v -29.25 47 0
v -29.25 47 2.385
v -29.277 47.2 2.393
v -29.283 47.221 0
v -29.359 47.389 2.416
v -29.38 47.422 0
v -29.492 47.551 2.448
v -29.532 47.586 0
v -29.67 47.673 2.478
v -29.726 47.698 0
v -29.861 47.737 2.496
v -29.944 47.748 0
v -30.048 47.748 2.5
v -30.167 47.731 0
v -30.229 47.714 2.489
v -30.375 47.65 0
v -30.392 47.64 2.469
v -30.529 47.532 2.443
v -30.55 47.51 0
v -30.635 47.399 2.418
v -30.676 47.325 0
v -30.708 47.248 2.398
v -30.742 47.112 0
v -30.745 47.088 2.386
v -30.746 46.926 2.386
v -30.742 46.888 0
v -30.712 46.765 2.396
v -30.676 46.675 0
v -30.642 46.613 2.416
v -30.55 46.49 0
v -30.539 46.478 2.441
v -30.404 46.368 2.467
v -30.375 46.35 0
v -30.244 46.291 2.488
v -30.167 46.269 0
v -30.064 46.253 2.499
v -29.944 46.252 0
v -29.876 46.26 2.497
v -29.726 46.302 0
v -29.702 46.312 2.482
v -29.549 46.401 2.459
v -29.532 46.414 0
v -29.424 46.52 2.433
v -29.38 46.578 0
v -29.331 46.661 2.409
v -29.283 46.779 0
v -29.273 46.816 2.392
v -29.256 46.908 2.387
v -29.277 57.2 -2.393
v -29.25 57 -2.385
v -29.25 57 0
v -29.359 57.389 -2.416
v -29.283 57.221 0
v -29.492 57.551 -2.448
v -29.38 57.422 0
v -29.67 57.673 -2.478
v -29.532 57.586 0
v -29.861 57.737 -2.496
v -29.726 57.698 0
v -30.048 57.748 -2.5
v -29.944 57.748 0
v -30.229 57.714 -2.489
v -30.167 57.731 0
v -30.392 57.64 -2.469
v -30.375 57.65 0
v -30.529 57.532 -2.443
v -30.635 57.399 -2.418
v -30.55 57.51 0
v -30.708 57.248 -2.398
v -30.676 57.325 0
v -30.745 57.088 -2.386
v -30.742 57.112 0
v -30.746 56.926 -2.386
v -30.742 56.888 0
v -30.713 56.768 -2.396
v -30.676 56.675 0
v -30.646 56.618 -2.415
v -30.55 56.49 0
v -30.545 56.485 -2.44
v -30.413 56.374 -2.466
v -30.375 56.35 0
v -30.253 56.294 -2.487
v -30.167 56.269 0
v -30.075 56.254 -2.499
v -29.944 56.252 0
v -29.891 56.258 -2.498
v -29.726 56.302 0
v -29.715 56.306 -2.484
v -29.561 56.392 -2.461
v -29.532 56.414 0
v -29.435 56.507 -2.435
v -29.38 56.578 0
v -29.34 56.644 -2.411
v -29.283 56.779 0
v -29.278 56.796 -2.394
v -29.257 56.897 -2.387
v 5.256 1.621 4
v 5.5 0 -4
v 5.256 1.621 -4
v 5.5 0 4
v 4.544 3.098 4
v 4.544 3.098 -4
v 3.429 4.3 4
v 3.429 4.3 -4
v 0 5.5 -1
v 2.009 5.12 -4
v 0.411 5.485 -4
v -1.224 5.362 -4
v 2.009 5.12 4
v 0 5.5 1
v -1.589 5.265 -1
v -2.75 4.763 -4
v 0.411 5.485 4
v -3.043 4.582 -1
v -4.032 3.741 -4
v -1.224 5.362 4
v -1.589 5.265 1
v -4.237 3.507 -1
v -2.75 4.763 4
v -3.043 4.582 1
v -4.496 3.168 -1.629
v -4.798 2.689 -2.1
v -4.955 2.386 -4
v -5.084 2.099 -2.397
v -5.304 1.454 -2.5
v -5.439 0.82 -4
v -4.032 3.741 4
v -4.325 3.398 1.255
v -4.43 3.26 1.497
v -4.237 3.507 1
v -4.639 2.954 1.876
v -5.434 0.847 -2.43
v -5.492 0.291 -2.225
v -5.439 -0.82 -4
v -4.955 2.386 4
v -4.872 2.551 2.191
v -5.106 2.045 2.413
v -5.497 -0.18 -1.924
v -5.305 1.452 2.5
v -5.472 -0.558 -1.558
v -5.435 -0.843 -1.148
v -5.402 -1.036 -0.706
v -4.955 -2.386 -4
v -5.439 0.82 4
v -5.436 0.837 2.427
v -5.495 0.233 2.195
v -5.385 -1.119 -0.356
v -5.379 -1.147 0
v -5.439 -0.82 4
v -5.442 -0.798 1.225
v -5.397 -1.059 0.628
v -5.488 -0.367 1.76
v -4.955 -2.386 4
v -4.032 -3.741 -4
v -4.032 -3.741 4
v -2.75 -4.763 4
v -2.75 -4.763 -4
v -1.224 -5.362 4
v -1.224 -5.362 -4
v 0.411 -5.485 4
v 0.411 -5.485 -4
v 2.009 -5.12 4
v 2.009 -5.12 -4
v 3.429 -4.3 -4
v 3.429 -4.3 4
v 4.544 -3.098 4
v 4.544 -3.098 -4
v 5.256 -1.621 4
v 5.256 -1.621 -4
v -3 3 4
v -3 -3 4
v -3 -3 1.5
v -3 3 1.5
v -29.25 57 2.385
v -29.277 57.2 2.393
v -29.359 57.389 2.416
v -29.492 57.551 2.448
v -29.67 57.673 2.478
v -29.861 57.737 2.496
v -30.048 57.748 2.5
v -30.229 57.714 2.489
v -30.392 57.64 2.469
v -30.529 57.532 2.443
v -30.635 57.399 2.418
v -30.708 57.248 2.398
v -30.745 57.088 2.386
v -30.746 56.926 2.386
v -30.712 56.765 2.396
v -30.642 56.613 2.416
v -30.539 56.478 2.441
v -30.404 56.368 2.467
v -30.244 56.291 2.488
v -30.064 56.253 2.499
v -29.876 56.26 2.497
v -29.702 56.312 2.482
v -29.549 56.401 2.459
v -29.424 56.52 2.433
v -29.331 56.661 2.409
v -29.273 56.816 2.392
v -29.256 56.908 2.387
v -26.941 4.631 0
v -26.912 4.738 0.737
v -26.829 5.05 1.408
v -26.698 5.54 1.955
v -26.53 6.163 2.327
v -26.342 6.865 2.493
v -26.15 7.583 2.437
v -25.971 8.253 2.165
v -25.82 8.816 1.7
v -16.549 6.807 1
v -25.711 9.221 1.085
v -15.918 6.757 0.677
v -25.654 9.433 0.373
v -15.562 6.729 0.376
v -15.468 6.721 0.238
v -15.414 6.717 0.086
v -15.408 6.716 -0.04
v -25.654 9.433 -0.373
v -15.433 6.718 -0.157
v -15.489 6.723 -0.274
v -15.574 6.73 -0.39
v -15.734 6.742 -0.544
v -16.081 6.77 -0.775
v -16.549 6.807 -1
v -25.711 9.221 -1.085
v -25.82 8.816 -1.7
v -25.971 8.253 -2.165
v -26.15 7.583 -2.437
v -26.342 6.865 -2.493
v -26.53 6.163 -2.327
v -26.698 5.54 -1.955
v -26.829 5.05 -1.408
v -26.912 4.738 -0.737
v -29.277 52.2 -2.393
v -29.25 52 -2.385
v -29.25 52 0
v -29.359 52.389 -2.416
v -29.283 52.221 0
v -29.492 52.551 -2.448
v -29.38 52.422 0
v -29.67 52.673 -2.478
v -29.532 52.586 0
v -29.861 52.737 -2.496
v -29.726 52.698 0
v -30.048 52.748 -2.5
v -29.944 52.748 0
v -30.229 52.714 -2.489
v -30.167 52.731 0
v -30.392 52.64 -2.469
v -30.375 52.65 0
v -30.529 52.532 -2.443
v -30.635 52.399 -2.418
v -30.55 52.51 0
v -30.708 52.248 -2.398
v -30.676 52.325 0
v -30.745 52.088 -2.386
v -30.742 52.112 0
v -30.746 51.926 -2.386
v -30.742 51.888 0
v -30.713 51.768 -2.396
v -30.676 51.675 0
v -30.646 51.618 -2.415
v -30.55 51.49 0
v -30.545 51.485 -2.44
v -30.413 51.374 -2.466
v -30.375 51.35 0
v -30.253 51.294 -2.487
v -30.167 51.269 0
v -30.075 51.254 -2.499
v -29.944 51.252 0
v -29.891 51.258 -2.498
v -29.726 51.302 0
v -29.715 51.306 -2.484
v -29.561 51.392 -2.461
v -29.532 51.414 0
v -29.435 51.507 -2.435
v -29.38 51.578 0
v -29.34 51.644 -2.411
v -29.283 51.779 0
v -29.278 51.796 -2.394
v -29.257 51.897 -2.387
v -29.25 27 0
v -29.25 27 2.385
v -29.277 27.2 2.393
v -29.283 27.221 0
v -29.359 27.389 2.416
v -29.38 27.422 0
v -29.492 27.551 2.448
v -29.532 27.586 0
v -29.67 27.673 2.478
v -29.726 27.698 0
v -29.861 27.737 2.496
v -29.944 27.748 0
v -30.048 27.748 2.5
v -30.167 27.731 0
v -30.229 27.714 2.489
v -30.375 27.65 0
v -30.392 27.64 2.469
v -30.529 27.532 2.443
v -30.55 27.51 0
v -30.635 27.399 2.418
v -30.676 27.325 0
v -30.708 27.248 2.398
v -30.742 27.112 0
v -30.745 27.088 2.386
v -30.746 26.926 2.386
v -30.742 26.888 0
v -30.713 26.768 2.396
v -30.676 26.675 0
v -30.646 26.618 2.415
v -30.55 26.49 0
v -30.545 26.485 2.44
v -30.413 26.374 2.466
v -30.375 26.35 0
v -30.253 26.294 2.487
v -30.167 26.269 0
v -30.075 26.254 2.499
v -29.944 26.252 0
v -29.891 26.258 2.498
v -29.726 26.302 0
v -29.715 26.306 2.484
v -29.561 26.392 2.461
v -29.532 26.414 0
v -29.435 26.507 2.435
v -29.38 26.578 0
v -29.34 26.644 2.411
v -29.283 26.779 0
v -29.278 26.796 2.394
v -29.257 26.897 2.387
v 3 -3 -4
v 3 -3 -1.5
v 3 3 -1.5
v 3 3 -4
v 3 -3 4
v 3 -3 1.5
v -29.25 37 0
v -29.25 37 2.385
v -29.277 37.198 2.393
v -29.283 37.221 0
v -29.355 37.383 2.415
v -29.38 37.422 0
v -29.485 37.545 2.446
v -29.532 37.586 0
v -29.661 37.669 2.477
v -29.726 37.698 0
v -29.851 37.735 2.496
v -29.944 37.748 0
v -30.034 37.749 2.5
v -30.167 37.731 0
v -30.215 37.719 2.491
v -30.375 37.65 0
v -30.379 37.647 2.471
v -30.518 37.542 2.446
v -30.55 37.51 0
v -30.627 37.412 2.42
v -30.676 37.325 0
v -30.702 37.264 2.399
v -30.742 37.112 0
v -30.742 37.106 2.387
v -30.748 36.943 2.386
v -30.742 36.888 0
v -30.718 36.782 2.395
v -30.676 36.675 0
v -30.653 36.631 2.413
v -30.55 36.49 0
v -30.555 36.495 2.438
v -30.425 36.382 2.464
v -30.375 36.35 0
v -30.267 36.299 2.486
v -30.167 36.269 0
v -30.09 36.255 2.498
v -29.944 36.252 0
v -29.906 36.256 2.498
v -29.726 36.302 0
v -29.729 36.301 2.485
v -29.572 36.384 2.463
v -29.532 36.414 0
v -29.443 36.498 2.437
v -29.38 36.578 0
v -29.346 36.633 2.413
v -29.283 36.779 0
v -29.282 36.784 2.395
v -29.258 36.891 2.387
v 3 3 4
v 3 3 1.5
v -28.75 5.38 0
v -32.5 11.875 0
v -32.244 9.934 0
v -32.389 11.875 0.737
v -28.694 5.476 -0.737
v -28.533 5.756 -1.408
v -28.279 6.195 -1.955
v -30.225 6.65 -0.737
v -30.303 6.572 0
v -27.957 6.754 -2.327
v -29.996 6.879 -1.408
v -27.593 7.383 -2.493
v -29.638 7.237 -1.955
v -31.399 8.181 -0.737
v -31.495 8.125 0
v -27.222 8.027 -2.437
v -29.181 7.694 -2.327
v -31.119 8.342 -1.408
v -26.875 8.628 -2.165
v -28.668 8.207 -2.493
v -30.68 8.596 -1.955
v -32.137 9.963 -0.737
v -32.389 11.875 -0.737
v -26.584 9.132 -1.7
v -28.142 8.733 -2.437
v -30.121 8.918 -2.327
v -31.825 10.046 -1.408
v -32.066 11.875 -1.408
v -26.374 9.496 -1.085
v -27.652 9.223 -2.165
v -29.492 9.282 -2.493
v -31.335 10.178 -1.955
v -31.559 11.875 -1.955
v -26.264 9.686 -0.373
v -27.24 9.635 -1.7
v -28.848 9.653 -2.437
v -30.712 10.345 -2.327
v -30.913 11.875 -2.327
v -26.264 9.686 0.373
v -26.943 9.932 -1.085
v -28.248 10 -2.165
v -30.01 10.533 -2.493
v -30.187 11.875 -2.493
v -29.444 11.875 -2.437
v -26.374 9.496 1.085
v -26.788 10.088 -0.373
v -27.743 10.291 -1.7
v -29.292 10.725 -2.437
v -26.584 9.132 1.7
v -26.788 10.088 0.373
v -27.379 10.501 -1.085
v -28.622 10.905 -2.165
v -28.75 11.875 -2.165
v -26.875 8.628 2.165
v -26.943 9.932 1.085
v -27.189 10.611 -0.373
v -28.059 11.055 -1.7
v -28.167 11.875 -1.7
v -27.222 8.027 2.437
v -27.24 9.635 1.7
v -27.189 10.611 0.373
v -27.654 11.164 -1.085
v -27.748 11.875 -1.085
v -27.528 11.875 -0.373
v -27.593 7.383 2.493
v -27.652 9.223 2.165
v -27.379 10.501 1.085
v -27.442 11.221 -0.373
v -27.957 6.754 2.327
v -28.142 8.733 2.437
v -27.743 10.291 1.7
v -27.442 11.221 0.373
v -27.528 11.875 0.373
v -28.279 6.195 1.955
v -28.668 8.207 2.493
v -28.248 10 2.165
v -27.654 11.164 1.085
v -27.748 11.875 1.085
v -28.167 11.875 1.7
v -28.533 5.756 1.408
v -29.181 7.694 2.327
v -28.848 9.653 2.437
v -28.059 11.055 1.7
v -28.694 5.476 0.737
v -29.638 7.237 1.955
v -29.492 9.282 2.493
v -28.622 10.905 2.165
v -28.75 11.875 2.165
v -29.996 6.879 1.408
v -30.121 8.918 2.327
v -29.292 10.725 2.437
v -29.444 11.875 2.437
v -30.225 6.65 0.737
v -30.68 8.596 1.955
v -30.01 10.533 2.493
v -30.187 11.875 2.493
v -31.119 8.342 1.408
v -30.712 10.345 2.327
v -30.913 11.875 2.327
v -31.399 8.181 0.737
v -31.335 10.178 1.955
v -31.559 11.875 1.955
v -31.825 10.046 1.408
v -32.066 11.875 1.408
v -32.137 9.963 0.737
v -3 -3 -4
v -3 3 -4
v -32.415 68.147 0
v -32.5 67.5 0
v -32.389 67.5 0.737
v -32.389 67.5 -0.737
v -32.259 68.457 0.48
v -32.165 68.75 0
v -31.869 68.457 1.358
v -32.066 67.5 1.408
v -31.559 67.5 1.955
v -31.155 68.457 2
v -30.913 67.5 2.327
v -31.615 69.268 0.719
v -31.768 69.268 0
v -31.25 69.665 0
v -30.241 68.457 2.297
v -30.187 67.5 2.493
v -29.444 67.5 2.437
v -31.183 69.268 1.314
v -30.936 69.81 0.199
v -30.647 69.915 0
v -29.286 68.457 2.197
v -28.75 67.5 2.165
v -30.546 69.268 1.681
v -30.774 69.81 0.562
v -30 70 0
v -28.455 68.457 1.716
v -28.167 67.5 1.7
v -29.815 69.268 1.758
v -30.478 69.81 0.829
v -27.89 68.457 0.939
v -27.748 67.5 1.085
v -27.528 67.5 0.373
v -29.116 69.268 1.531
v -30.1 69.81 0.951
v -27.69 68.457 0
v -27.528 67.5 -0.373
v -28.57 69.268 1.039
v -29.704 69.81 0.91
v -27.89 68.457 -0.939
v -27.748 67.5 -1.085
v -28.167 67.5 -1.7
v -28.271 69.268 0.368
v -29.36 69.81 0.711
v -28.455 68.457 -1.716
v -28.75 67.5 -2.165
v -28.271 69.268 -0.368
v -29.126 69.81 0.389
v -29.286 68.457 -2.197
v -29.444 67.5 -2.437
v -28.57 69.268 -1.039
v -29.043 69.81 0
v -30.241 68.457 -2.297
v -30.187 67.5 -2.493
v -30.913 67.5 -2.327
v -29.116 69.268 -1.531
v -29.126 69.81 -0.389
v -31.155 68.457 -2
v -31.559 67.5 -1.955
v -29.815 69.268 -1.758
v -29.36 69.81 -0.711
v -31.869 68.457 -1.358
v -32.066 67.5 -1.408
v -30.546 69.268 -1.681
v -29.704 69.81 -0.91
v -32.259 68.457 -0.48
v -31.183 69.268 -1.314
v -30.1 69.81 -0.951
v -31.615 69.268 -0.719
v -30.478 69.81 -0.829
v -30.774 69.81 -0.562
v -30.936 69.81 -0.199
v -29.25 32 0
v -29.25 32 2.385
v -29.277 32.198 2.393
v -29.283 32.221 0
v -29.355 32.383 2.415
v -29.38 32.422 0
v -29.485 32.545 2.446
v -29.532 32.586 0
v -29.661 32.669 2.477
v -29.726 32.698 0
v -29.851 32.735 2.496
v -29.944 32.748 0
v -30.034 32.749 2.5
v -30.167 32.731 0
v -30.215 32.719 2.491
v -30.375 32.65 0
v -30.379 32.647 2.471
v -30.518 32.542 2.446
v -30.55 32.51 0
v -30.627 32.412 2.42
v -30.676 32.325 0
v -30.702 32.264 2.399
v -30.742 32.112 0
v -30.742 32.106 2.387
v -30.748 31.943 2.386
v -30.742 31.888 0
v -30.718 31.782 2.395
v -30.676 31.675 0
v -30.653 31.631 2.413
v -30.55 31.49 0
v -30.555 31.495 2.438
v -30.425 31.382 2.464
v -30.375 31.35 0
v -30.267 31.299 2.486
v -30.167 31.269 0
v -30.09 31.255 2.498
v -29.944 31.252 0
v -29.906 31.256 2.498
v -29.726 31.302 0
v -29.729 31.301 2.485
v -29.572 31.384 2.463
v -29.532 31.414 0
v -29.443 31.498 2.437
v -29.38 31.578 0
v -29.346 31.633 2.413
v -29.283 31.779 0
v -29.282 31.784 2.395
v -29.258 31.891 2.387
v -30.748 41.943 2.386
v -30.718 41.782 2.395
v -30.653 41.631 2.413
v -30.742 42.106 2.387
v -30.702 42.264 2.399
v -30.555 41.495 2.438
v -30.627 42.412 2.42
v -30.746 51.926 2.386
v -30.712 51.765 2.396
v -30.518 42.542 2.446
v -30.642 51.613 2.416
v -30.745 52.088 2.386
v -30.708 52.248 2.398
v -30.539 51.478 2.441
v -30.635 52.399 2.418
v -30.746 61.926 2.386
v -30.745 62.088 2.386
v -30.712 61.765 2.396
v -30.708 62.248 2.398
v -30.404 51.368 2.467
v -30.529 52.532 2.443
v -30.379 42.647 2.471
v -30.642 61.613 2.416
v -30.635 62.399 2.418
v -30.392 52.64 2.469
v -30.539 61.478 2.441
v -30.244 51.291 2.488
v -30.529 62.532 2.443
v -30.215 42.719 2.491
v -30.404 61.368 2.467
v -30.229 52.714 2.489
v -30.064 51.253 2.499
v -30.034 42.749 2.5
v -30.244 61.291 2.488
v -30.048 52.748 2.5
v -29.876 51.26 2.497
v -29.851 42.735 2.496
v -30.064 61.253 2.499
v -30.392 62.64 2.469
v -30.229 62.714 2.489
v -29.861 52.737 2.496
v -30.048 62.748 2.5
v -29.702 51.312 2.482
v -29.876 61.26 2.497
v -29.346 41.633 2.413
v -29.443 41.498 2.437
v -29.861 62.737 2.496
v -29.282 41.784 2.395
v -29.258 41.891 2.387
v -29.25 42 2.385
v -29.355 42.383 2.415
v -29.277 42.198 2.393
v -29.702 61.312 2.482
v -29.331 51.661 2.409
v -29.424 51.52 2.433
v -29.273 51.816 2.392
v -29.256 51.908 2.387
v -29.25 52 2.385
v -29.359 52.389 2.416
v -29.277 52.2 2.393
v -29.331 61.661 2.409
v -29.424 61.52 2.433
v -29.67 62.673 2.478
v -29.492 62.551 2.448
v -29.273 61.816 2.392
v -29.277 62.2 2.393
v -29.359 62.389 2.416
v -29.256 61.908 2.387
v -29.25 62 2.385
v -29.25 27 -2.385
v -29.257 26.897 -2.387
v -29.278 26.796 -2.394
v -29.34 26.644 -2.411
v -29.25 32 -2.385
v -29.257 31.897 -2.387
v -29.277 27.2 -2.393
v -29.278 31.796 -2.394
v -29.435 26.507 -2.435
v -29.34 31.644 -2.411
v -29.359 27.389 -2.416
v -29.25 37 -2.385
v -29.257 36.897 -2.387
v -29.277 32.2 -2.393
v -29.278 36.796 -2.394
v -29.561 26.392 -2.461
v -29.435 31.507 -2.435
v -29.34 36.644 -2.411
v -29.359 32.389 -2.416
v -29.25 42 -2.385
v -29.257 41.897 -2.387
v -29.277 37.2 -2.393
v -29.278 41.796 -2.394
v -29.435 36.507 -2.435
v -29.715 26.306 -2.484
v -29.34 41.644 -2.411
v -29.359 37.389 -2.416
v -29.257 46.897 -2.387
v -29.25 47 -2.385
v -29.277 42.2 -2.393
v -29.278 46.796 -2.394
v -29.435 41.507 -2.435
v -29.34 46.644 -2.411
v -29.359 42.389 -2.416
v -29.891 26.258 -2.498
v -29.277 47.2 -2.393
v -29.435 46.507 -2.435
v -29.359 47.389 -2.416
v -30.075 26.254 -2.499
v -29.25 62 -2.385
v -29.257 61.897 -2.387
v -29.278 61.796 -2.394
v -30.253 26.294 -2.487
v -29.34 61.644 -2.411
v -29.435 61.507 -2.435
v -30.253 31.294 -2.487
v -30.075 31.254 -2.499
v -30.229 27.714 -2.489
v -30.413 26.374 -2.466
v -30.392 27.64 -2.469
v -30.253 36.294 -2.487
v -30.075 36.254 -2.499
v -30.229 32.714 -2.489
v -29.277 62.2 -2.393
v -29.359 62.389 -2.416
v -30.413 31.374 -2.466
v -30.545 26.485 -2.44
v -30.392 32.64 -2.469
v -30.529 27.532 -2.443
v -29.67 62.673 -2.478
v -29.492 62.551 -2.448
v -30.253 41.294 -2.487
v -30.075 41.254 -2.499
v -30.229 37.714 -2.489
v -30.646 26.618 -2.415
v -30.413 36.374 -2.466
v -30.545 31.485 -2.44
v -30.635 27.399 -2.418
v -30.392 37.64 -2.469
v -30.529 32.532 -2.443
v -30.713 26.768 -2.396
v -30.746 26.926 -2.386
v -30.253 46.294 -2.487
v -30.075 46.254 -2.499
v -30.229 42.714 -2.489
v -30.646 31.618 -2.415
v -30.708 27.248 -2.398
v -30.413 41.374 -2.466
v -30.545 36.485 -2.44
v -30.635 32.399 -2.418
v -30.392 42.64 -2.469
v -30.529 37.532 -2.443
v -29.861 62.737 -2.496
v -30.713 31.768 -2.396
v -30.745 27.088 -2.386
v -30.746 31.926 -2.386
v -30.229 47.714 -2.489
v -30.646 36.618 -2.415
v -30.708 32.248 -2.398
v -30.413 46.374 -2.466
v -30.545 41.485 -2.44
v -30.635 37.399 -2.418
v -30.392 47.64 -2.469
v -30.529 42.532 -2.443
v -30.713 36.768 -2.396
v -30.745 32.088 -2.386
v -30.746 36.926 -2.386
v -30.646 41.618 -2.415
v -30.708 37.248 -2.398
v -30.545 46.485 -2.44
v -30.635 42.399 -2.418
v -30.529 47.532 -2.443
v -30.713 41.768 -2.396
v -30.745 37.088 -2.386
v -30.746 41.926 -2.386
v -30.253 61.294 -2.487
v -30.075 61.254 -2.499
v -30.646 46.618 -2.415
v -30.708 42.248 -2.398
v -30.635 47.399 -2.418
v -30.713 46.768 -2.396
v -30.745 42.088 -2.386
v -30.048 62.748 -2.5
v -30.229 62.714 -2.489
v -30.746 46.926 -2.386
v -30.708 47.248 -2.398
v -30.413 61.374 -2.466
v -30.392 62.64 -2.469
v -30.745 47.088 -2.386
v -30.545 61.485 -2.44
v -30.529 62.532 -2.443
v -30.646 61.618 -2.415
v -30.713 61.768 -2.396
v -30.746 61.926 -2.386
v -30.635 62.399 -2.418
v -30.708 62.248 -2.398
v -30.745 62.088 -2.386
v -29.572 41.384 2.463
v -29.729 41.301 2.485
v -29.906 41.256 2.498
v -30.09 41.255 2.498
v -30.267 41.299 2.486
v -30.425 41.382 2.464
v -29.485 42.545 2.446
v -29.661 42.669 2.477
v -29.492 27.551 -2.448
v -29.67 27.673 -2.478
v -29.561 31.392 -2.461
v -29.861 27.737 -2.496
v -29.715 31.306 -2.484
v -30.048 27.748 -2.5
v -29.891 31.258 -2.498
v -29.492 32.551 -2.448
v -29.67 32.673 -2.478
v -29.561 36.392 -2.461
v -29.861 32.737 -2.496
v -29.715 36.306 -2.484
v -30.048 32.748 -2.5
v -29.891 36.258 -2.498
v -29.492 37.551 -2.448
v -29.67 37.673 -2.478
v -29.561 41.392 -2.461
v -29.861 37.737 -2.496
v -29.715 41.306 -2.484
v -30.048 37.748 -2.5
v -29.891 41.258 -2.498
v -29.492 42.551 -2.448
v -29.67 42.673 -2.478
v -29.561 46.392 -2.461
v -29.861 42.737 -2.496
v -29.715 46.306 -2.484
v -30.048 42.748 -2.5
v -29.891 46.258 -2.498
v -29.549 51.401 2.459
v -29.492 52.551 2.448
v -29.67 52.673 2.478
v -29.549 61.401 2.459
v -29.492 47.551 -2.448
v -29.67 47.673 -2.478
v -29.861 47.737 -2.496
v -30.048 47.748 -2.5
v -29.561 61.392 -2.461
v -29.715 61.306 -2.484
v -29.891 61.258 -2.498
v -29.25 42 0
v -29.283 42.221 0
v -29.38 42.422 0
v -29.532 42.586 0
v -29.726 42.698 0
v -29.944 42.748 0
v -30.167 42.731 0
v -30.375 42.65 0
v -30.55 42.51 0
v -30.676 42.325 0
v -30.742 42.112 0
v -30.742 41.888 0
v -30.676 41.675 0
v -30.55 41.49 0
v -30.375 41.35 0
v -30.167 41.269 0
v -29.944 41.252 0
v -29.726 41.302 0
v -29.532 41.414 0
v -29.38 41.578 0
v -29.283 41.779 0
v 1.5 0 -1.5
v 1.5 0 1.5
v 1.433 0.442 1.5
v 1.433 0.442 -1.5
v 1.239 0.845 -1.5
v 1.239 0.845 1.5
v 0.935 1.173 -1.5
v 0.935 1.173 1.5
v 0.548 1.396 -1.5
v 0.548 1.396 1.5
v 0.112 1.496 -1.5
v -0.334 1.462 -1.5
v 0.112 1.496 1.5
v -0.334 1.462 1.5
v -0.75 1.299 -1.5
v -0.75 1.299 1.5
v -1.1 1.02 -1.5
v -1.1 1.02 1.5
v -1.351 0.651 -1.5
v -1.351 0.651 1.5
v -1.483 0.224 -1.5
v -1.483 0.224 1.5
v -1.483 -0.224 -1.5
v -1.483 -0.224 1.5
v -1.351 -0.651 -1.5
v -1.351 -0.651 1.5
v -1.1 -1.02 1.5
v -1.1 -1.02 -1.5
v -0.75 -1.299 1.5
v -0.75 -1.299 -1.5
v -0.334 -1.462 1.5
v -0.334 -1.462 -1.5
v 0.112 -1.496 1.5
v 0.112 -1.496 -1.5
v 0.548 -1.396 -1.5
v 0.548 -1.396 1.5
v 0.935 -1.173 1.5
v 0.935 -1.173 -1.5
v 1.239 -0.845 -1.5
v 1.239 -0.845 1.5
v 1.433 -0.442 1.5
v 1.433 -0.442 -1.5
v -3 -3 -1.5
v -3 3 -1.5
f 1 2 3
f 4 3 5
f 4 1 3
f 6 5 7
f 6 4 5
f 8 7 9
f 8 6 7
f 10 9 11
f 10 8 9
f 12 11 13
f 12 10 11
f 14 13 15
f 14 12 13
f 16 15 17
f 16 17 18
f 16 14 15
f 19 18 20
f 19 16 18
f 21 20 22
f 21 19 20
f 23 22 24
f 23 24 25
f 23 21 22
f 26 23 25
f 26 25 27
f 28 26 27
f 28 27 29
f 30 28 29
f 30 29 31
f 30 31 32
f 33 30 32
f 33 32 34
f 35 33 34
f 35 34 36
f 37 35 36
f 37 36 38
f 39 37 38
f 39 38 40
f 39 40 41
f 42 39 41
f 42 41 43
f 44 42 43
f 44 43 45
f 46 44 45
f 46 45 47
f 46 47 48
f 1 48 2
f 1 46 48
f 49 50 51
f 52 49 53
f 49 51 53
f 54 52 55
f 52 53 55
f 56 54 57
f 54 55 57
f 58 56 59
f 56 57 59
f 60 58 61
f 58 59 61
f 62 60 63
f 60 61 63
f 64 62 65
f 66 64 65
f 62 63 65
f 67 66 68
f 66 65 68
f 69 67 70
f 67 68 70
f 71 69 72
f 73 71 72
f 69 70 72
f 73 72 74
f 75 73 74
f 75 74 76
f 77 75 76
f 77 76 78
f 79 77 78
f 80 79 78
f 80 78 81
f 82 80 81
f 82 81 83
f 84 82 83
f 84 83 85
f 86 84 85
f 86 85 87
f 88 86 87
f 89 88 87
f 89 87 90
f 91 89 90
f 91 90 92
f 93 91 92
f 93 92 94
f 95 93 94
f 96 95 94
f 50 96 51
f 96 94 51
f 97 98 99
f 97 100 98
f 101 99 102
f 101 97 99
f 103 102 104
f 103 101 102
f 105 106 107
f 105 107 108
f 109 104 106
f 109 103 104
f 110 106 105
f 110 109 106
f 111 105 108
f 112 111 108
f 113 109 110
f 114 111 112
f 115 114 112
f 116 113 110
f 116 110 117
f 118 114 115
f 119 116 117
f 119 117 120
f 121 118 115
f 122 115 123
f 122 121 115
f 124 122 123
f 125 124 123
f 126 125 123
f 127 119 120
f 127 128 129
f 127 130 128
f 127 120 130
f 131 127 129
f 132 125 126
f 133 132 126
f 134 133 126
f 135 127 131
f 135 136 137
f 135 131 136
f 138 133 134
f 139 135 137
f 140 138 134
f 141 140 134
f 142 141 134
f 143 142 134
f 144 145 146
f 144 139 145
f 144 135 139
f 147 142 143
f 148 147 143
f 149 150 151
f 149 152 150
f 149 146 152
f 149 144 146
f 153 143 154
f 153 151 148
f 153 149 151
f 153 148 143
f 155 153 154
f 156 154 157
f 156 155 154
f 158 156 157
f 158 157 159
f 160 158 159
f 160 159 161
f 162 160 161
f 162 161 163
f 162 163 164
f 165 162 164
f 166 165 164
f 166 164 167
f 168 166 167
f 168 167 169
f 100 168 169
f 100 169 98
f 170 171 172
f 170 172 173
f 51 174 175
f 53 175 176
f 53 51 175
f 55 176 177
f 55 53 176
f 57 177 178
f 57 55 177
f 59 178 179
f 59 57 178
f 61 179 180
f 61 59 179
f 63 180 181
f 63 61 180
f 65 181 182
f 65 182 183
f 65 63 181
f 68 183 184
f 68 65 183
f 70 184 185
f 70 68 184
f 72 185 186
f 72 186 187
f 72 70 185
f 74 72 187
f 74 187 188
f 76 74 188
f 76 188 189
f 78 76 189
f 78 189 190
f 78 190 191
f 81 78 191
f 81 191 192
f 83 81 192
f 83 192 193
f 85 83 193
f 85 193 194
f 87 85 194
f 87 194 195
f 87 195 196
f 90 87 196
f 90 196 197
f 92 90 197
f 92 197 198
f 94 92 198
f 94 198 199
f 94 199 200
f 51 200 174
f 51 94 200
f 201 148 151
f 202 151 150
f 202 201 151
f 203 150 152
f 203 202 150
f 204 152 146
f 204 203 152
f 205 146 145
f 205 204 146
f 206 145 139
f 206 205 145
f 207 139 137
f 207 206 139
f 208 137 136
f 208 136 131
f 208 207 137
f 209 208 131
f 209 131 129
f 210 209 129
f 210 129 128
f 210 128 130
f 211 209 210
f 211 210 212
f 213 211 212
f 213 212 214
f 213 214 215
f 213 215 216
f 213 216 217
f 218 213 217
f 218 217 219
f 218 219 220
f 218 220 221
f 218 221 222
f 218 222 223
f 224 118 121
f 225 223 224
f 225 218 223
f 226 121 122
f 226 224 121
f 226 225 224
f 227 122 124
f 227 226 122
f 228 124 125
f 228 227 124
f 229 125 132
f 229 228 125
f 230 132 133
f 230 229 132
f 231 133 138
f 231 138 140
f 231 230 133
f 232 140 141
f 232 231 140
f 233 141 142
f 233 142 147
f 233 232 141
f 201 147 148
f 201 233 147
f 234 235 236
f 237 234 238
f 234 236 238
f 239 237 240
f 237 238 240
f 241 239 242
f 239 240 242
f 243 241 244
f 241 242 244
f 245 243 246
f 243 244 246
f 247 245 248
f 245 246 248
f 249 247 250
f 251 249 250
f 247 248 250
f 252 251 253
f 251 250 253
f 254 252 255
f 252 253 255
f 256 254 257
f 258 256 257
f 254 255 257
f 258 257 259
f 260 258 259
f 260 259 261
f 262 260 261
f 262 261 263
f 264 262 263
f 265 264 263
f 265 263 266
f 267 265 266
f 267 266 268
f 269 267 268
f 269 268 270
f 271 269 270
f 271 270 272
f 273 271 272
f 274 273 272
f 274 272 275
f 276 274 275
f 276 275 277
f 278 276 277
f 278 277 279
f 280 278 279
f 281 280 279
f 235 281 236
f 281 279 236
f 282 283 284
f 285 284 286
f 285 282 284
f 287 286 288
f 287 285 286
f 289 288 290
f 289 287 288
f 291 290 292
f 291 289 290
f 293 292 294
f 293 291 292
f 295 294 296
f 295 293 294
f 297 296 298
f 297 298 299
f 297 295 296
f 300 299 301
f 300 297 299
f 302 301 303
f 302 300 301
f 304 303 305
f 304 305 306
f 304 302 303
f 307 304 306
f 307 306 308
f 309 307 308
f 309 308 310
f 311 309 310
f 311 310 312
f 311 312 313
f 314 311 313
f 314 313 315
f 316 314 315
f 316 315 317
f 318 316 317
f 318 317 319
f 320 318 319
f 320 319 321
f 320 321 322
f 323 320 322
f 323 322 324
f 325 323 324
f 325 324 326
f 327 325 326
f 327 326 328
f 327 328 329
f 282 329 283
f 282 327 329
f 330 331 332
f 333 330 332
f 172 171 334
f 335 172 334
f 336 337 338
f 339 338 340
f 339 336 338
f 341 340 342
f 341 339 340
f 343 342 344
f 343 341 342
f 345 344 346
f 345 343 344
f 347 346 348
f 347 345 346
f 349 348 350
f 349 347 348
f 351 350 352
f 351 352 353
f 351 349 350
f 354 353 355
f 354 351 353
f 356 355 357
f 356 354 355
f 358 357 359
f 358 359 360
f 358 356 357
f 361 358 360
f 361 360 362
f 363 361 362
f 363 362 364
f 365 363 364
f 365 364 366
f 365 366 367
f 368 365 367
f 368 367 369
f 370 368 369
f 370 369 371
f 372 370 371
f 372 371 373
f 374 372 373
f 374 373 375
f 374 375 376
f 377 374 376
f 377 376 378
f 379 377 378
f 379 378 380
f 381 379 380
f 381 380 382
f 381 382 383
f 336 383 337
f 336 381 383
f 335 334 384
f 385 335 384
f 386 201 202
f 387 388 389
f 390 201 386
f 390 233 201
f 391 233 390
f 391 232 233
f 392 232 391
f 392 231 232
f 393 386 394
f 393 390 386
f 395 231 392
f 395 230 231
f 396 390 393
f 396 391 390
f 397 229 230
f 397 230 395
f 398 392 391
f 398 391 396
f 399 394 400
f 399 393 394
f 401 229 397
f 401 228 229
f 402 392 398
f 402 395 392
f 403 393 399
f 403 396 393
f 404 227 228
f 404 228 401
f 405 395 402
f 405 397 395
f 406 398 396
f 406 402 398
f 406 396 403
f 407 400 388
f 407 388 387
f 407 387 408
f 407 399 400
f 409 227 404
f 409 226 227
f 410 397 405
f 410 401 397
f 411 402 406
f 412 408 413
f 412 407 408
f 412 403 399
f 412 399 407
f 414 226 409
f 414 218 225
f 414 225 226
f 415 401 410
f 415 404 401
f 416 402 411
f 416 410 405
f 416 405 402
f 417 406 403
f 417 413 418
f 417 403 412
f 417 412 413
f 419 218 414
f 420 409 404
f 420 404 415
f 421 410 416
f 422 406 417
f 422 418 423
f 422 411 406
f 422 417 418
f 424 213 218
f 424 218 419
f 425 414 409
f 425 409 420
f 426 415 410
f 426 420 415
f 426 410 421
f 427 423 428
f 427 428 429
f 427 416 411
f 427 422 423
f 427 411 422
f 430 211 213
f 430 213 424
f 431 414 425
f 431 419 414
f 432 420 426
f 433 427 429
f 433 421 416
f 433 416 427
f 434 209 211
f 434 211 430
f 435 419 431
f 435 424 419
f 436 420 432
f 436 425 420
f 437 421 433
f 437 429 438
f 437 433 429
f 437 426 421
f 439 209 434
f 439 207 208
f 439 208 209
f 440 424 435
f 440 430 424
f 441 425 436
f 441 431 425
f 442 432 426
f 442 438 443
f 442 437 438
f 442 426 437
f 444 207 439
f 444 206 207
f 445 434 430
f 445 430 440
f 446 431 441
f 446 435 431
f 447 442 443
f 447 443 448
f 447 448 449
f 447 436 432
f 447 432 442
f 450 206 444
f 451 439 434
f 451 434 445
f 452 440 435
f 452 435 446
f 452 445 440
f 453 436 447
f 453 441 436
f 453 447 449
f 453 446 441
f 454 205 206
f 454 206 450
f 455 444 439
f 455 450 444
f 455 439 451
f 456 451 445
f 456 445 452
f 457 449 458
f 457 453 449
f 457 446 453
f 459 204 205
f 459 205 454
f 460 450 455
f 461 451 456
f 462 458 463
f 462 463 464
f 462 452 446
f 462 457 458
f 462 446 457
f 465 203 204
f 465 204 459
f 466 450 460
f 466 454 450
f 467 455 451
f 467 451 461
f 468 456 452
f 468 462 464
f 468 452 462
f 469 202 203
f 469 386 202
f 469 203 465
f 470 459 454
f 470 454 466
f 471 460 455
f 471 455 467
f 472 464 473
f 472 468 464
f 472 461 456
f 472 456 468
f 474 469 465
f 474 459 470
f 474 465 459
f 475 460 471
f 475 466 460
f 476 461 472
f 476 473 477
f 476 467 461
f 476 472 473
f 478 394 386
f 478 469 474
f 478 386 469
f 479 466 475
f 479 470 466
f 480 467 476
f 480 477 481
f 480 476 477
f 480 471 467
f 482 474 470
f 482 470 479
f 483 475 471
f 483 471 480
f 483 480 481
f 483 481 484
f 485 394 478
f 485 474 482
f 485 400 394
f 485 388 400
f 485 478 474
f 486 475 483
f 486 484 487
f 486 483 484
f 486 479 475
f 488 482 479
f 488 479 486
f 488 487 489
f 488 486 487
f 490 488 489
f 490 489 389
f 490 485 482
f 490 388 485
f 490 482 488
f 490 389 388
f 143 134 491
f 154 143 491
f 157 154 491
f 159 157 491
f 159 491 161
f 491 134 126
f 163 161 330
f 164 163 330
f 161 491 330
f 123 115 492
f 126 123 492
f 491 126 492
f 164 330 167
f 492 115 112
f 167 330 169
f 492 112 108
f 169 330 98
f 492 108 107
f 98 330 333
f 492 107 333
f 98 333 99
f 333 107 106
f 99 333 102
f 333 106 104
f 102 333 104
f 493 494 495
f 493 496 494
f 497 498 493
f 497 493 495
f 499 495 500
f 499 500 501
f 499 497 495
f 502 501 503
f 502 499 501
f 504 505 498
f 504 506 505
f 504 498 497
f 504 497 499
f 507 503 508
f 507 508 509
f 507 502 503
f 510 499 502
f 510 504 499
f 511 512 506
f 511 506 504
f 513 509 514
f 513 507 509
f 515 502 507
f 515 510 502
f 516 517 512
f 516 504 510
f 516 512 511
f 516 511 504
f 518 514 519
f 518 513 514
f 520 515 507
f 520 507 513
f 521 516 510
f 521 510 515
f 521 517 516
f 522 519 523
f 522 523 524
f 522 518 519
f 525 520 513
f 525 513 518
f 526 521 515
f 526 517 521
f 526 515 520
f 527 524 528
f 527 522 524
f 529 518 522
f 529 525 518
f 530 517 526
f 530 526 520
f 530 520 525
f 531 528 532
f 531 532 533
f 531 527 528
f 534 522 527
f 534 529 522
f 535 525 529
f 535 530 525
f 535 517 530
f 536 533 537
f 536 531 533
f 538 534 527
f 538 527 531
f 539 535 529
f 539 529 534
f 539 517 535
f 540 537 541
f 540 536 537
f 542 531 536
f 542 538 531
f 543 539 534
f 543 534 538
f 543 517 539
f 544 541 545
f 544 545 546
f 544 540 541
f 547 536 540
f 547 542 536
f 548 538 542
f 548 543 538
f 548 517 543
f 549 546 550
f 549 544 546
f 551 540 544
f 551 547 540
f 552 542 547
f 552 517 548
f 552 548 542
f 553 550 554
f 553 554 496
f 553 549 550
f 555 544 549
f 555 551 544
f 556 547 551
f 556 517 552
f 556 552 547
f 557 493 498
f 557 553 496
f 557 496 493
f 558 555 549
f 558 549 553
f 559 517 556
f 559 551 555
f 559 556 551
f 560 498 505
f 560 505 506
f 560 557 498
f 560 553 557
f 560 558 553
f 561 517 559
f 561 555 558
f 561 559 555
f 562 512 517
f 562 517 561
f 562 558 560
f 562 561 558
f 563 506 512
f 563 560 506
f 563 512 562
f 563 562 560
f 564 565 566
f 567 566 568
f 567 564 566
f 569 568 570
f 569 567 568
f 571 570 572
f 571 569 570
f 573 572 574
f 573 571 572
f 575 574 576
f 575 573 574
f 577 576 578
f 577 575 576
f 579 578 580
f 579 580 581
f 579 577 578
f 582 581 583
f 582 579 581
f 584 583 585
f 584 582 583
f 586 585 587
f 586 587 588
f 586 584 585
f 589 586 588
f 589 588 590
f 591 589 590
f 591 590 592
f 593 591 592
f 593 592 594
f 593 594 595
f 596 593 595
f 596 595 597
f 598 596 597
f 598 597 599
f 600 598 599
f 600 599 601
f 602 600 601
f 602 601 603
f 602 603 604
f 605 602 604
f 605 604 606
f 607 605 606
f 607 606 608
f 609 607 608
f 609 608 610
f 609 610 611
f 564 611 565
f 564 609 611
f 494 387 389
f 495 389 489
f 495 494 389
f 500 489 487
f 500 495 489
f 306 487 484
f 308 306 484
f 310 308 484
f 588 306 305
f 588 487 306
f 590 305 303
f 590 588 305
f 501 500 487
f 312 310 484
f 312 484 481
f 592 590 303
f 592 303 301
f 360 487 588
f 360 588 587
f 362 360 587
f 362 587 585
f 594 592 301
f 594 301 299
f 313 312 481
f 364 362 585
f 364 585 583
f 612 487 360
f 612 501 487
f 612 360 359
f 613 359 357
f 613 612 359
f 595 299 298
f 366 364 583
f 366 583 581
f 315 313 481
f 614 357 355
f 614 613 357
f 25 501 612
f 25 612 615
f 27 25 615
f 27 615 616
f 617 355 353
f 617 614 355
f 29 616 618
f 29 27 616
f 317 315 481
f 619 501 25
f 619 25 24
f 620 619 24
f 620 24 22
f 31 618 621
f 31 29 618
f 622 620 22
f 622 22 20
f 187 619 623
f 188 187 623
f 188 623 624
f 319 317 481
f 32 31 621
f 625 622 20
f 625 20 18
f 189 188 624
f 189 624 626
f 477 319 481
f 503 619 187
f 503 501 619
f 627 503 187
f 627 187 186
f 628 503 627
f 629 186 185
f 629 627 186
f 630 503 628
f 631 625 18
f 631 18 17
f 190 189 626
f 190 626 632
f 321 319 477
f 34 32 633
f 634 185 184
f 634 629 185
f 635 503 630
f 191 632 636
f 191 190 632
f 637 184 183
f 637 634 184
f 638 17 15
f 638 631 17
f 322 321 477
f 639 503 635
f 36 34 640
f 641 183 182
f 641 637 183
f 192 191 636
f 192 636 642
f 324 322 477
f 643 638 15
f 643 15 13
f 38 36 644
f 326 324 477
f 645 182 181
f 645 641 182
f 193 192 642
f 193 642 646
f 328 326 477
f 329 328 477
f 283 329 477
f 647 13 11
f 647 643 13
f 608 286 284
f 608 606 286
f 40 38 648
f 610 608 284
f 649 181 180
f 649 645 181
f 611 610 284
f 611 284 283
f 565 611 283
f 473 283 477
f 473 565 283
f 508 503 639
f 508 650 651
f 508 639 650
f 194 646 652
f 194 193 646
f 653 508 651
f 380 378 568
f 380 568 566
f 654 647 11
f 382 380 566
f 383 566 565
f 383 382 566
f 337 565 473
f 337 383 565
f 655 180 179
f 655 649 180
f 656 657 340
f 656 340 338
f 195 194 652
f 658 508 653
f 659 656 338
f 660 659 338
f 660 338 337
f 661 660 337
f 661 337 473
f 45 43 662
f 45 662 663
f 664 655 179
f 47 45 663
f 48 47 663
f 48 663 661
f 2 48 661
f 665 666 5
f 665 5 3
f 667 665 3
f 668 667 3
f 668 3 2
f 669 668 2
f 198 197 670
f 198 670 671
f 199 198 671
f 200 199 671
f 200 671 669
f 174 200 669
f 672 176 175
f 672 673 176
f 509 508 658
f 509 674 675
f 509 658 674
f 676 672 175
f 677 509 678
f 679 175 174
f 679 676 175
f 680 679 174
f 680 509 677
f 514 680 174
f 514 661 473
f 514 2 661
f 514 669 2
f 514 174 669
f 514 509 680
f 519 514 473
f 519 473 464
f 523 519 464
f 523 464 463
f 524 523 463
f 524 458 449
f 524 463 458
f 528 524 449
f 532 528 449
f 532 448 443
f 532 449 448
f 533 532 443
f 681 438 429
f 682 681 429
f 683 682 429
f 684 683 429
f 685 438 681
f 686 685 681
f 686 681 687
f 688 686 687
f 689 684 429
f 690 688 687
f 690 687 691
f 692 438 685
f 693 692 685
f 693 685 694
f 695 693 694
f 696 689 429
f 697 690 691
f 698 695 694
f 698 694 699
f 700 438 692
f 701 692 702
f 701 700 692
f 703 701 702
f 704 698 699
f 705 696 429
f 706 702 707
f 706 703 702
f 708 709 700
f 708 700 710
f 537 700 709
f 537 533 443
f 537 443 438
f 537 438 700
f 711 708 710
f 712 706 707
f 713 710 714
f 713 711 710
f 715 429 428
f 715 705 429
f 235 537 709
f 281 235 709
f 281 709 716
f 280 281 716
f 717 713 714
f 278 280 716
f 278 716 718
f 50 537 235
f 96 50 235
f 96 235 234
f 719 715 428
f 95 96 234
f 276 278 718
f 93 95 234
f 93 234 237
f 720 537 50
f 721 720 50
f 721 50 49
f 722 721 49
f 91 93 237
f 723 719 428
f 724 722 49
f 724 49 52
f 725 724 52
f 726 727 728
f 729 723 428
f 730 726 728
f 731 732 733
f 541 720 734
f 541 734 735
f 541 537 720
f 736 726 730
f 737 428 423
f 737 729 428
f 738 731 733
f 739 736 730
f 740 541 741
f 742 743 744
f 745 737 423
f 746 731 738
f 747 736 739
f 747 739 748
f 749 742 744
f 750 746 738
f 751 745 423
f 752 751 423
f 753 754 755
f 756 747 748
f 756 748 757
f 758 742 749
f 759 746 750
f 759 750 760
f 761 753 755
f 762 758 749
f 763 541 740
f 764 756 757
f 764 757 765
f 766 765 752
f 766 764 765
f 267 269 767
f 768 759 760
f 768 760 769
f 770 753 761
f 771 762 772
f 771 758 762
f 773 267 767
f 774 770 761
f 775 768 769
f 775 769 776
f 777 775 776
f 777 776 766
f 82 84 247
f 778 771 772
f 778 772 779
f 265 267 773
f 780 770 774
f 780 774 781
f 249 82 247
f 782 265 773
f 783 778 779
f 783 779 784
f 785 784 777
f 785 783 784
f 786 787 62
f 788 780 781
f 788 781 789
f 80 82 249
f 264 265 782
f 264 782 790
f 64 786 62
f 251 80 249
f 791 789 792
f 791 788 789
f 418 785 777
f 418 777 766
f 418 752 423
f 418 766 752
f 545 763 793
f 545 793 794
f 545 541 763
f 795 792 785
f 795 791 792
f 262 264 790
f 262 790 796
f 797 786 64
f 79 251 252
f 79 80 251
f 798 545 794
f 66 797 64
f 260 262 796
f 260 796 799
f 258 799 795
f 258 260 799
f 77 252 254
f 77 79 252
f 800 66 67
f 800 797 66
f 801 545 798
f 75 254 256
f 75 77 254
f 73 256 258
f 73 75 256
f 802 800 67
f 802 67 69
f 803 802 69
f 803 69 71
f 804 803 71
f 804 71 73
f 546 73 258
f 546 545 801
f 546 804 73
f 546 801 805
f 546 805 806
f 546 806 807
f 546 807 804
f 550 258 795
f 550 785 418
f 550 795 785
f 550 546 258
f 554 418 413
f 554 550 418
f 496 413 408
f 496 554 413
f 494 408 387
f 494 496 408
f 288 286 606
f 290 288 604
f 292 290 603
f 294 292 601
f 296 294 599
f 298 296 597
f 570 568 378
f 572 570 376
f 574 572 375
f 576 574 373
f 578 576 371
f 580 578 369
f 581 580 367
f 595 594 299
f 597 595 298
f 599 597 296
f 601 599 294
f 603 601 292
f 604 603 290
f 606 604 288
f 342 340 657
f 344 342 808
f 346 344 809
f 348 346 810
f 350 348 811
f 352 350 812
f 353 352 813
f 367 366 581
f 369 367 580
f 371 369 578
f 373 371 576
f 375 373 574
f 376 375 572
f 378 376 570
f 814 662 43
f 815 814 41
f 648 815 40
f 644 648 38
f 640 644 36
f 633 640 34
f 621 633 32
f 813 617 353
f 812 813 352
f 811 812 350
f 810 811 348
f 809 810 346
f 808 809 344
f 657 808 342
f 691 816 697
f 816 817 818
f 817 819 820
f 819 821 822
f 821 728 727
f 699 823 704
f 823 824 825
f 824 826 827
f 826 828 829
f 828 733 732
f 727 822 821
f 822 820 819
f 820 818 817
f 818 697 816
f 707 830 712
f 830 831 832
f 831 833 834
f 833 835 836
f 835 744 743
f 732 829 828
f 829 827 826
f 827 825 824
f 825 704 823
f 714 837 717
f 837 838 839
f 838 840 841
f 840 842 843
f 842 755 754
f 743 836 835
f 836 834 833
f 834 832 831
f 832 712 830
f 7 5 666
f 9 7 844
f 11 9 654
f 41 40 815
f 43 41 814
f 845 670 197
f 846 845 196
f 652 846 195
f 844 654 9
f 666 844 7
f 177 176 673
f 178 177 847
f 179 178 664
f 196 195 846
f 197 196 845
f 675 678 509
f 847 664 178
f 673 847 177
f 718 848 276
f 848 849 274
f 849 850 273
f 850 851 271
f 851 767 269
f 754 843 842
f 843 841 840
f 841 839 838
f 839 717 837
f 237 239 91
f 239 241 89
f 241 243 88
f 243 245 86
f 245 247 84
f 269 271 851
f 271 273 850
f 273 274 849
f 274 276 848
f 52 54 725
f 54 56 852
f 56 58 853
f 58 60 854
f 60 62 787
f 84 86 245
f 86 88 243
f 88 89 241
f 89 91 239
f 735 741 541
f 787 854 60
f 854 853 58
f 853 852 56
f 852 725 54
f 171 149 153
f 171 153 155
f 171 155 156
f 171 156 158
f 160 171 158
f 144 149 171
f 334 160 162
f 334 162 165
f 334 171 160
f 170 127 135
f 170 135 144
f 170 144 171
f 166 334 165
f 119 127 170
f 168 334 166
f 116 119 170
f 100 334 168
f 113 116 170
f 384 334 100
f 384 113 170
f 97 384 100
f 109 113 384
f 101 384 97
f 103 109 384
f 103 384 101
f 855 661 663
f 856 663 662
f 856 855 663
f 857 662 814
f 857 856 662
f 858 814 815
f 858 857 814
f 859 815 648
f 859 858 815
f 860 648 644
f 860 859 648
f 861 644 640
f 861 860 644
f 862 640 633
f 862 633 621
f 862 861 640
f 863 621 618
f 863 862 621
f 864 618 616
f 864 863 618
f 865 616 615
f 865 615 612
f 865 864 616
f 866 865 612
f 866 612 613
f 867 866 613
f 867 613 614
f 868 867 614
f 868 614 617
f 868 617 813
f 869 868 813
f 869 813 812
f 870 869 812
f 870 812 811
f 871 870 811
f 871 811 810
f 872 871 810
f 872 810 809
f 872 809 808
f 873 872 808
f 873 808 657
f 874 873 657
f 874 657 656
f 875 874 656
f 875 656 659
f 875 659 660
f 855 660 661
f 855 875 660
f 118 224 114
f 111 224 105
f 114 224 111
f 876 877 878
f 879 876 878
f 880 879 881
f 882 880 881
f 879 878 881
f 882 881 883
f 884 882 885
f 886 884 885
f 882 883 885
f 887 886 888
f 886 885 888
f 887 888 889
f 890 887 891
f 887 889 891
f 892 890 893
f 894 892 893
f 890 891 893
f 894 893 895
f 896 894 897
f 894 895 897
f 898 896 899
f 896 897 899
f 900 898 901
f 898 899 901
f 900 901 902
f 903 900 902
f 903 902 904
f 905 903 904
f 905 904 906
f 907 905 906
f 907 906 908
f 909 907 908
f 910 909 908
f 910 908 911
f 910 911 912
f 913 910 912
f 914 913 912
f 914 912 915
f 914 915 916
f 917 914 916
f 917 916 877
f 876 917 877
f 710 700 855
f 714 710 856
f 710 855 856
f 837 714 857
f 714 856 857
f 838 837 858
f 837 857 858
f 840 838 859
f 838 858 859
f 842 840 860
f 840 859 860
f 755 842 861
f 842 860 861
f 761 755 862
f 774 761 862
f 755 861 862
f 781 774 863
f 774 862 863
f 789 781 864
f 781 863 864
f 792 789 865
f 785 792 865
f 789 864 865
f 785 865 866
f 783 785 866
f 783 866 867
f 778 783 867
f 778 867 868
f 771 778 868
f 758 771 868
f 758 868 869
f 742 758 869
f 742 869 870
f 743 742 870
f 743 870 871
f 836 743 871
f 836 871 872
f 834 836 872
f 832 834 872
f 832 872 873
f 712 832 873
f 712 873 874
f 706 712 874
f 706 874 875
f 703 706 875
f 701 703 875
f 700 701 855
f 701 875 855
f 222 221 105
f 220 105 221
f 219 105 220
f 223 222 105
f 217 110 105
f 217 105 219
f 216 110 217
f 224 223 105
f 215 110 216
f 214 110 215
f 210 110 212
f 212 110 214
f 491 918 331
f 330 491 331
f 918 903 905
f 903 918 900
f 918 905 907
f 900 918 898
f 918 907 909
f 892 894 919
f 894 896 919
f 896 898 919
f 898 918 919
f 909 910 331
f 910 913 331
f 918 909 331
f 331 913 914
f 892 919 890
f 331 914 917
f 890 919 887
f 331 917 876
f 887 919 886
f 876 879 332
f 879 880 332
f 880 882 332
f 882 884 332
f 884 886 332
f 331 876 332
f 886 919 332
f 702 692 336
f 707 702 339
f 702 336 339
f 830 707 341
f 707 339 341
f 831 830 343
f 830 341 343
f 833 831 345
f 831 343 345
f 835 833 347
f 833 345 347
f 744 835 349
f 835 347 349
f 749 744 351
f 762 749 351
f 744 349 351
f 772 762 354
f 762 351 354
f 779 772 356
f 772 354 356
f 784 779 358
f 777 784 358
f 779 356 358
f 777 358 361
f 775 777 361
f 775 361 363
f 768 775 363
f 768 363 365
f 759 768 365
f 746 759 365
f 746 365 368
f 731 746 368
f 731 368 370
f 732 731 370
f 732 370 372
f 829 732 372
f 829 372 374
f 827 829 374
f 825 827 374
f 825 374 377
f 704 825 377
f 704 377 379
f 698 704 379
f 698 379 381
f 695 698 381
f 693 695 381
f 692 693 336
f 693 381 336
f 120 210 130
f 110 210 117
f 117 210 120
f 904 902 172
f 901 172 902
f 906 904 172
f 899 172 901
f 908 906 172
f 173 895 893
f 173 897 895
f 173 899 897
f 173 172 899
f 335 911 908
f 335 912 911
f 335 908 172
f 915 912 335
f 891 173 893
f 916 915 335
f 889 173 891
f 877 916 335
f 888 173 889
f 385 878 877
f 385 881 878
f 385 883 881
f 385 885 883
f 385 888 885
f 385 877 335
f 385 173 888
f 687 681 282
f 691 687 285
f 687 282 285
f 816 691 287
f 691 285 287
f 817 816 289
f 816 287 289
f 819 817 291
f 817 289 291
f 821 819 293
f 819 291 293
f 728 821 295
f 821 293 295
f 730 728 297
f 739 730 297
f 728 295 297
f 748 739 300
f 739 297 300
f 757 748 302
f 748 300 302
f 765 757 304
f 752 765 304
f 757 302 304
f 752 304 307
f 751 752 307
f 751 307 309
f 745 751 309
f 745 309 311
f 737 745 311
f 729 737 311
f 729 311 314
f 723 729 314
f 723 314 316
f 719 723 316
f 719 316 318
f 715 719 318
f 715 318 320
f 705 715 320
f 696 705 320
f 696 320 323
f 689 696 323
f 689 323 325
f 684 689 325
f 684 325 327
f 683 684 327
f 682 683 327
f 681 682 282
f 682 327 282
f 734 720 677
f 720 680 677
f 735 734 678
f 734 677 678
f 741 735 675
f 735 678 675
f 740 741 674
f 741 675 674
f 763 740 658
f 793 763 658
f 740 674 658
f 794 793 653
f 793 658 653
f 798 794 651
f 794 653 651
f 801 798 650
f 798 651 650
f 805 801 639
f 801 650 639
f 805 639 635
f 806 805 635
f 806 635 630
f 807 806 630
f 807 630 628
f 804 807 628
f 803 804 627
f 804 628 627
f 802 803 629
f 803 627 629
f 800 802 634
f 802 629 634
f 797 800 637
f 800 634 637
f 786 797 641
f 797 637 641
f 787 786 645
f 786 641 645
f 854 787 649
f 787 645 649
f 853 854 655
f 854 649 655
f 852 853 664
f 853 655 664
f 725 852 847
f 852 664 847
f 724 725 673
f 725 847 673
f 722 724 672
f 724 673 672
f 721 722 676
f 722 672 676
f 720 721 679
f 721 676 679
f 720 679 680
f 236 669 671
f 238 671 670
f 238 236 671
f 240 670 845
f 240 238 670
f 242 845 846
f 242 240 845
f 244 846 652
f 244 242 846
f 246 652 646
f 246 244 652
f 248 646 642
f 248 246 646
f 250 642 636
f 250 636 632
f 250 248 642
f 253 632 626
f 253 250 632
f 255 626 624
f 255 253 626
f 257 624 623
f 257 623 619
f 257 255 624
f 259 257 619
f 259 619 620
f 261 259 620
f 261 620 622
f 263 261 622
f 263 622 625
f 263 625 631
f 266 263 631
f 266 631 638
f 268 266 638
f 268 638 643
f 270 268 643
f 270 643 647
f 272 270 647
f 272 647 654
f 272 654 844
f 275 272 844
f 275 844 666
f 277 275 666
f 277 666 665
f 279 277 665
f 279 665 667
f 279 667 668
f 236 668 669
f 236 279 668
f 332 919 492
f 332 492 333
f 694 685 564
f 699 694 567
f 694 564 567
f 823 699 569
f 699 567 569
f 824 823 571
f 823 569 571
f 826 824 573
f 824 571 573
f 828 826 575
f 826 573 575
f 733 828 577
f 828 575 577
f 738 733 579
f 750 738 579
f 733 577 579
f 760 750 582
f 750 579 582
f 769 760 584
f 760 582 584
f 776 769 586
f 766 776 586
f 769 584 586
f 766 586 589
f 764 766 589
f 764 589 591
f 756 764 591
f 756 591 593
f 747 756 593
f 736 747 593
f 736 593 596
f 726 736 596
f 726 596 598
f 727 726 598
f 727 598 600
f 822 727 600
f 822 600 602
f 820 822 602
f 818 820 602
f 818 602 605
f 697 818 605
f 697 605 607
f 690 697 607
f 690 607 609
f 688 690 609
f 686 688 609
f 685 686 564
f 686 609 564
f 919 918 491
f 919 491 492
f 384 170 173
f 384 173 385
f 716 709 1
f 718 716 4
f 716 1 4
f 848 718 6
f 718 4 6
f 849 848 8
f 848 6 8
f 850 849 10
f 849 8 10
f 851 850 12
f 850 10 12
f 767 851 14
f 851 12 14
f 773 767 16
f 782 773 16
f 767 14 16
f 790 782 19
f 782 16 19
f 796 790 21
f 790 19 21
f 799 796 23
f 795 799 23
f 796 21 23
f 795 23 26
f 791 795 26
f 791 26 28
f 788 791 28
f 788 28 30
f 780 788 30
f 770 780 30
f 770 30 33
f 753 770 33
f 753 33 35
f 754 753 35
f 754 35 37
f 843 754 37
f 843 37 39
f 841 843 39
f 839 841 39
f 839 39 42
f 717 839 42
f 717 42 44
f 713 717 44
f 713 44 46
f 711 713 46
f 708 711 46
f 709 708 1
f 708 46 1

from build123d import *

# Parameters (mm, degrees)
ESQUISSE1_R             = 5.5
ESQUISSE1_W             = 6
ESQUISSE1_H             = 6
BASE_EXTRUSION_DEPTH    = 4
ESQUISSE2_W             = 6
ESQUISSE2_H             = 6
BOSS_EXTRU_1_DEPTH      = 1.5
ESQUISSE3_R             = 1.5
ENL_V_MAT_EXTRU_1_DEPTH = 6.5
ESQUISSE6_R             = 2.5
CONG_1_R                = 2.5
ESQUISSE7_R             = 0.75
ENL_V_MAT_EXTRU_2_DEPTH = 11.5
BOSS_EXTRU_2_DEPTH      = 1


with BuildPart() as part:
    # Esquisse1 → Base-Extrusion (new body, symmetric)
    with BuildSketch(Plane.XY):
        Circle(ESQUISSE1_R)
        Rectangle(ESQUISSE1_W, ESQUISSE1_H, mode=Mode.SUBTRACT)
    extrude(amount=BASE_EXTRUSION_DEPTH, both=True)

    # Esquisse2 → Boss.-Extru.1 (add, symmetric)
    with BuildSketch(Plane.XY):
        Rectangle(ESQUISSE2_W, ESQUISSE2_H)
    extrude(amount=BOSS_EXTRU_1_DEPTH, both=True)

    # Esquisse3 → Enl_v. mat.-Extru.1 (cut, through all)
    with BuildSketch(Plane.XY.offset(1.5)):
        Circle(ESQUISSE3_R)
    extrude(amount=-ENL_V_MAT_EXTRU_1_DEPTH, mode=Mode.SUBTRACT)

    # Boss.-Balayage1: sweep along a curve in space
    with BuildLine() as boss_balayage1_path:
        Line((-3.728314003, 0.998998726, 0), (-26.294095226, 7.045481581, 0))
        ThreePointArc((-26.294095226, 7.045481581, 0), (-28.966766701, 8.831303568, 0), (-30, 11.875110713, 0))
        Line((-30, 11.875110713, 0), (-30, 70, 0))
    # Esquisse6 → Boss.-Balayage1 (sweep)
    with BuildSketch(Plane(origin=(0, 70, 0), x_dir=(-1, 0, 0), z_dir=(0, 1, 0))):
        with Locations((30, 0)):
            Circle(ESQUISSE6_R)
    sweep(path=boss_balayage1_path.line)

    # Cong_1
    cong_1_edges = [part.edges().sort_by_distance(p)[0] for p in [
        (-27.5, 70, 0),
    ]]
    fillet(cong_1_edges, radius=CONG_1_R)

    # Esquisse7 → Enl_v. mat.-Extru.2 (cut, symmetric)
    with BuildSketch(Plane.XY):
        with Locations((-30, 27)):
            Circle(ESQUISSE7_R)
        with Locations((-30, 32)):
            Circle(ESQUISSE7_R)
        with Locations((-30, 37)):
            Circle(ESQUISSE7_R)
        with Locations((-30, 42)):
            Circle(ESQUISSE7_R)
        with Locations((-30, 47)):
            Circle(ESQUISSE7_R)
        with Locations((-30, 52)):
            Circle(ESQUISSE7_R)
        with Locations((-30, 57)):
            Circle(ESQUISSE7_R)
        with Locations((-30, 62)):
            Circle(ESQUISSE7_R)
    extrude(amount=ENL_V_MAT_EXTRU_2_DEPTH, both=True, mode=Mode.SUBTRACT)

    # Esquisse8 → Boss.-Extru.2 (add, symmetric)
    with BuildSketch(Plane.XY):
        Polygon((0, 5.5), (-19, 7), (-2, 2), align=None)
    extrude(amount=BOSS_EXTRU_2_DEPTH, both=True)


solid = part.part
